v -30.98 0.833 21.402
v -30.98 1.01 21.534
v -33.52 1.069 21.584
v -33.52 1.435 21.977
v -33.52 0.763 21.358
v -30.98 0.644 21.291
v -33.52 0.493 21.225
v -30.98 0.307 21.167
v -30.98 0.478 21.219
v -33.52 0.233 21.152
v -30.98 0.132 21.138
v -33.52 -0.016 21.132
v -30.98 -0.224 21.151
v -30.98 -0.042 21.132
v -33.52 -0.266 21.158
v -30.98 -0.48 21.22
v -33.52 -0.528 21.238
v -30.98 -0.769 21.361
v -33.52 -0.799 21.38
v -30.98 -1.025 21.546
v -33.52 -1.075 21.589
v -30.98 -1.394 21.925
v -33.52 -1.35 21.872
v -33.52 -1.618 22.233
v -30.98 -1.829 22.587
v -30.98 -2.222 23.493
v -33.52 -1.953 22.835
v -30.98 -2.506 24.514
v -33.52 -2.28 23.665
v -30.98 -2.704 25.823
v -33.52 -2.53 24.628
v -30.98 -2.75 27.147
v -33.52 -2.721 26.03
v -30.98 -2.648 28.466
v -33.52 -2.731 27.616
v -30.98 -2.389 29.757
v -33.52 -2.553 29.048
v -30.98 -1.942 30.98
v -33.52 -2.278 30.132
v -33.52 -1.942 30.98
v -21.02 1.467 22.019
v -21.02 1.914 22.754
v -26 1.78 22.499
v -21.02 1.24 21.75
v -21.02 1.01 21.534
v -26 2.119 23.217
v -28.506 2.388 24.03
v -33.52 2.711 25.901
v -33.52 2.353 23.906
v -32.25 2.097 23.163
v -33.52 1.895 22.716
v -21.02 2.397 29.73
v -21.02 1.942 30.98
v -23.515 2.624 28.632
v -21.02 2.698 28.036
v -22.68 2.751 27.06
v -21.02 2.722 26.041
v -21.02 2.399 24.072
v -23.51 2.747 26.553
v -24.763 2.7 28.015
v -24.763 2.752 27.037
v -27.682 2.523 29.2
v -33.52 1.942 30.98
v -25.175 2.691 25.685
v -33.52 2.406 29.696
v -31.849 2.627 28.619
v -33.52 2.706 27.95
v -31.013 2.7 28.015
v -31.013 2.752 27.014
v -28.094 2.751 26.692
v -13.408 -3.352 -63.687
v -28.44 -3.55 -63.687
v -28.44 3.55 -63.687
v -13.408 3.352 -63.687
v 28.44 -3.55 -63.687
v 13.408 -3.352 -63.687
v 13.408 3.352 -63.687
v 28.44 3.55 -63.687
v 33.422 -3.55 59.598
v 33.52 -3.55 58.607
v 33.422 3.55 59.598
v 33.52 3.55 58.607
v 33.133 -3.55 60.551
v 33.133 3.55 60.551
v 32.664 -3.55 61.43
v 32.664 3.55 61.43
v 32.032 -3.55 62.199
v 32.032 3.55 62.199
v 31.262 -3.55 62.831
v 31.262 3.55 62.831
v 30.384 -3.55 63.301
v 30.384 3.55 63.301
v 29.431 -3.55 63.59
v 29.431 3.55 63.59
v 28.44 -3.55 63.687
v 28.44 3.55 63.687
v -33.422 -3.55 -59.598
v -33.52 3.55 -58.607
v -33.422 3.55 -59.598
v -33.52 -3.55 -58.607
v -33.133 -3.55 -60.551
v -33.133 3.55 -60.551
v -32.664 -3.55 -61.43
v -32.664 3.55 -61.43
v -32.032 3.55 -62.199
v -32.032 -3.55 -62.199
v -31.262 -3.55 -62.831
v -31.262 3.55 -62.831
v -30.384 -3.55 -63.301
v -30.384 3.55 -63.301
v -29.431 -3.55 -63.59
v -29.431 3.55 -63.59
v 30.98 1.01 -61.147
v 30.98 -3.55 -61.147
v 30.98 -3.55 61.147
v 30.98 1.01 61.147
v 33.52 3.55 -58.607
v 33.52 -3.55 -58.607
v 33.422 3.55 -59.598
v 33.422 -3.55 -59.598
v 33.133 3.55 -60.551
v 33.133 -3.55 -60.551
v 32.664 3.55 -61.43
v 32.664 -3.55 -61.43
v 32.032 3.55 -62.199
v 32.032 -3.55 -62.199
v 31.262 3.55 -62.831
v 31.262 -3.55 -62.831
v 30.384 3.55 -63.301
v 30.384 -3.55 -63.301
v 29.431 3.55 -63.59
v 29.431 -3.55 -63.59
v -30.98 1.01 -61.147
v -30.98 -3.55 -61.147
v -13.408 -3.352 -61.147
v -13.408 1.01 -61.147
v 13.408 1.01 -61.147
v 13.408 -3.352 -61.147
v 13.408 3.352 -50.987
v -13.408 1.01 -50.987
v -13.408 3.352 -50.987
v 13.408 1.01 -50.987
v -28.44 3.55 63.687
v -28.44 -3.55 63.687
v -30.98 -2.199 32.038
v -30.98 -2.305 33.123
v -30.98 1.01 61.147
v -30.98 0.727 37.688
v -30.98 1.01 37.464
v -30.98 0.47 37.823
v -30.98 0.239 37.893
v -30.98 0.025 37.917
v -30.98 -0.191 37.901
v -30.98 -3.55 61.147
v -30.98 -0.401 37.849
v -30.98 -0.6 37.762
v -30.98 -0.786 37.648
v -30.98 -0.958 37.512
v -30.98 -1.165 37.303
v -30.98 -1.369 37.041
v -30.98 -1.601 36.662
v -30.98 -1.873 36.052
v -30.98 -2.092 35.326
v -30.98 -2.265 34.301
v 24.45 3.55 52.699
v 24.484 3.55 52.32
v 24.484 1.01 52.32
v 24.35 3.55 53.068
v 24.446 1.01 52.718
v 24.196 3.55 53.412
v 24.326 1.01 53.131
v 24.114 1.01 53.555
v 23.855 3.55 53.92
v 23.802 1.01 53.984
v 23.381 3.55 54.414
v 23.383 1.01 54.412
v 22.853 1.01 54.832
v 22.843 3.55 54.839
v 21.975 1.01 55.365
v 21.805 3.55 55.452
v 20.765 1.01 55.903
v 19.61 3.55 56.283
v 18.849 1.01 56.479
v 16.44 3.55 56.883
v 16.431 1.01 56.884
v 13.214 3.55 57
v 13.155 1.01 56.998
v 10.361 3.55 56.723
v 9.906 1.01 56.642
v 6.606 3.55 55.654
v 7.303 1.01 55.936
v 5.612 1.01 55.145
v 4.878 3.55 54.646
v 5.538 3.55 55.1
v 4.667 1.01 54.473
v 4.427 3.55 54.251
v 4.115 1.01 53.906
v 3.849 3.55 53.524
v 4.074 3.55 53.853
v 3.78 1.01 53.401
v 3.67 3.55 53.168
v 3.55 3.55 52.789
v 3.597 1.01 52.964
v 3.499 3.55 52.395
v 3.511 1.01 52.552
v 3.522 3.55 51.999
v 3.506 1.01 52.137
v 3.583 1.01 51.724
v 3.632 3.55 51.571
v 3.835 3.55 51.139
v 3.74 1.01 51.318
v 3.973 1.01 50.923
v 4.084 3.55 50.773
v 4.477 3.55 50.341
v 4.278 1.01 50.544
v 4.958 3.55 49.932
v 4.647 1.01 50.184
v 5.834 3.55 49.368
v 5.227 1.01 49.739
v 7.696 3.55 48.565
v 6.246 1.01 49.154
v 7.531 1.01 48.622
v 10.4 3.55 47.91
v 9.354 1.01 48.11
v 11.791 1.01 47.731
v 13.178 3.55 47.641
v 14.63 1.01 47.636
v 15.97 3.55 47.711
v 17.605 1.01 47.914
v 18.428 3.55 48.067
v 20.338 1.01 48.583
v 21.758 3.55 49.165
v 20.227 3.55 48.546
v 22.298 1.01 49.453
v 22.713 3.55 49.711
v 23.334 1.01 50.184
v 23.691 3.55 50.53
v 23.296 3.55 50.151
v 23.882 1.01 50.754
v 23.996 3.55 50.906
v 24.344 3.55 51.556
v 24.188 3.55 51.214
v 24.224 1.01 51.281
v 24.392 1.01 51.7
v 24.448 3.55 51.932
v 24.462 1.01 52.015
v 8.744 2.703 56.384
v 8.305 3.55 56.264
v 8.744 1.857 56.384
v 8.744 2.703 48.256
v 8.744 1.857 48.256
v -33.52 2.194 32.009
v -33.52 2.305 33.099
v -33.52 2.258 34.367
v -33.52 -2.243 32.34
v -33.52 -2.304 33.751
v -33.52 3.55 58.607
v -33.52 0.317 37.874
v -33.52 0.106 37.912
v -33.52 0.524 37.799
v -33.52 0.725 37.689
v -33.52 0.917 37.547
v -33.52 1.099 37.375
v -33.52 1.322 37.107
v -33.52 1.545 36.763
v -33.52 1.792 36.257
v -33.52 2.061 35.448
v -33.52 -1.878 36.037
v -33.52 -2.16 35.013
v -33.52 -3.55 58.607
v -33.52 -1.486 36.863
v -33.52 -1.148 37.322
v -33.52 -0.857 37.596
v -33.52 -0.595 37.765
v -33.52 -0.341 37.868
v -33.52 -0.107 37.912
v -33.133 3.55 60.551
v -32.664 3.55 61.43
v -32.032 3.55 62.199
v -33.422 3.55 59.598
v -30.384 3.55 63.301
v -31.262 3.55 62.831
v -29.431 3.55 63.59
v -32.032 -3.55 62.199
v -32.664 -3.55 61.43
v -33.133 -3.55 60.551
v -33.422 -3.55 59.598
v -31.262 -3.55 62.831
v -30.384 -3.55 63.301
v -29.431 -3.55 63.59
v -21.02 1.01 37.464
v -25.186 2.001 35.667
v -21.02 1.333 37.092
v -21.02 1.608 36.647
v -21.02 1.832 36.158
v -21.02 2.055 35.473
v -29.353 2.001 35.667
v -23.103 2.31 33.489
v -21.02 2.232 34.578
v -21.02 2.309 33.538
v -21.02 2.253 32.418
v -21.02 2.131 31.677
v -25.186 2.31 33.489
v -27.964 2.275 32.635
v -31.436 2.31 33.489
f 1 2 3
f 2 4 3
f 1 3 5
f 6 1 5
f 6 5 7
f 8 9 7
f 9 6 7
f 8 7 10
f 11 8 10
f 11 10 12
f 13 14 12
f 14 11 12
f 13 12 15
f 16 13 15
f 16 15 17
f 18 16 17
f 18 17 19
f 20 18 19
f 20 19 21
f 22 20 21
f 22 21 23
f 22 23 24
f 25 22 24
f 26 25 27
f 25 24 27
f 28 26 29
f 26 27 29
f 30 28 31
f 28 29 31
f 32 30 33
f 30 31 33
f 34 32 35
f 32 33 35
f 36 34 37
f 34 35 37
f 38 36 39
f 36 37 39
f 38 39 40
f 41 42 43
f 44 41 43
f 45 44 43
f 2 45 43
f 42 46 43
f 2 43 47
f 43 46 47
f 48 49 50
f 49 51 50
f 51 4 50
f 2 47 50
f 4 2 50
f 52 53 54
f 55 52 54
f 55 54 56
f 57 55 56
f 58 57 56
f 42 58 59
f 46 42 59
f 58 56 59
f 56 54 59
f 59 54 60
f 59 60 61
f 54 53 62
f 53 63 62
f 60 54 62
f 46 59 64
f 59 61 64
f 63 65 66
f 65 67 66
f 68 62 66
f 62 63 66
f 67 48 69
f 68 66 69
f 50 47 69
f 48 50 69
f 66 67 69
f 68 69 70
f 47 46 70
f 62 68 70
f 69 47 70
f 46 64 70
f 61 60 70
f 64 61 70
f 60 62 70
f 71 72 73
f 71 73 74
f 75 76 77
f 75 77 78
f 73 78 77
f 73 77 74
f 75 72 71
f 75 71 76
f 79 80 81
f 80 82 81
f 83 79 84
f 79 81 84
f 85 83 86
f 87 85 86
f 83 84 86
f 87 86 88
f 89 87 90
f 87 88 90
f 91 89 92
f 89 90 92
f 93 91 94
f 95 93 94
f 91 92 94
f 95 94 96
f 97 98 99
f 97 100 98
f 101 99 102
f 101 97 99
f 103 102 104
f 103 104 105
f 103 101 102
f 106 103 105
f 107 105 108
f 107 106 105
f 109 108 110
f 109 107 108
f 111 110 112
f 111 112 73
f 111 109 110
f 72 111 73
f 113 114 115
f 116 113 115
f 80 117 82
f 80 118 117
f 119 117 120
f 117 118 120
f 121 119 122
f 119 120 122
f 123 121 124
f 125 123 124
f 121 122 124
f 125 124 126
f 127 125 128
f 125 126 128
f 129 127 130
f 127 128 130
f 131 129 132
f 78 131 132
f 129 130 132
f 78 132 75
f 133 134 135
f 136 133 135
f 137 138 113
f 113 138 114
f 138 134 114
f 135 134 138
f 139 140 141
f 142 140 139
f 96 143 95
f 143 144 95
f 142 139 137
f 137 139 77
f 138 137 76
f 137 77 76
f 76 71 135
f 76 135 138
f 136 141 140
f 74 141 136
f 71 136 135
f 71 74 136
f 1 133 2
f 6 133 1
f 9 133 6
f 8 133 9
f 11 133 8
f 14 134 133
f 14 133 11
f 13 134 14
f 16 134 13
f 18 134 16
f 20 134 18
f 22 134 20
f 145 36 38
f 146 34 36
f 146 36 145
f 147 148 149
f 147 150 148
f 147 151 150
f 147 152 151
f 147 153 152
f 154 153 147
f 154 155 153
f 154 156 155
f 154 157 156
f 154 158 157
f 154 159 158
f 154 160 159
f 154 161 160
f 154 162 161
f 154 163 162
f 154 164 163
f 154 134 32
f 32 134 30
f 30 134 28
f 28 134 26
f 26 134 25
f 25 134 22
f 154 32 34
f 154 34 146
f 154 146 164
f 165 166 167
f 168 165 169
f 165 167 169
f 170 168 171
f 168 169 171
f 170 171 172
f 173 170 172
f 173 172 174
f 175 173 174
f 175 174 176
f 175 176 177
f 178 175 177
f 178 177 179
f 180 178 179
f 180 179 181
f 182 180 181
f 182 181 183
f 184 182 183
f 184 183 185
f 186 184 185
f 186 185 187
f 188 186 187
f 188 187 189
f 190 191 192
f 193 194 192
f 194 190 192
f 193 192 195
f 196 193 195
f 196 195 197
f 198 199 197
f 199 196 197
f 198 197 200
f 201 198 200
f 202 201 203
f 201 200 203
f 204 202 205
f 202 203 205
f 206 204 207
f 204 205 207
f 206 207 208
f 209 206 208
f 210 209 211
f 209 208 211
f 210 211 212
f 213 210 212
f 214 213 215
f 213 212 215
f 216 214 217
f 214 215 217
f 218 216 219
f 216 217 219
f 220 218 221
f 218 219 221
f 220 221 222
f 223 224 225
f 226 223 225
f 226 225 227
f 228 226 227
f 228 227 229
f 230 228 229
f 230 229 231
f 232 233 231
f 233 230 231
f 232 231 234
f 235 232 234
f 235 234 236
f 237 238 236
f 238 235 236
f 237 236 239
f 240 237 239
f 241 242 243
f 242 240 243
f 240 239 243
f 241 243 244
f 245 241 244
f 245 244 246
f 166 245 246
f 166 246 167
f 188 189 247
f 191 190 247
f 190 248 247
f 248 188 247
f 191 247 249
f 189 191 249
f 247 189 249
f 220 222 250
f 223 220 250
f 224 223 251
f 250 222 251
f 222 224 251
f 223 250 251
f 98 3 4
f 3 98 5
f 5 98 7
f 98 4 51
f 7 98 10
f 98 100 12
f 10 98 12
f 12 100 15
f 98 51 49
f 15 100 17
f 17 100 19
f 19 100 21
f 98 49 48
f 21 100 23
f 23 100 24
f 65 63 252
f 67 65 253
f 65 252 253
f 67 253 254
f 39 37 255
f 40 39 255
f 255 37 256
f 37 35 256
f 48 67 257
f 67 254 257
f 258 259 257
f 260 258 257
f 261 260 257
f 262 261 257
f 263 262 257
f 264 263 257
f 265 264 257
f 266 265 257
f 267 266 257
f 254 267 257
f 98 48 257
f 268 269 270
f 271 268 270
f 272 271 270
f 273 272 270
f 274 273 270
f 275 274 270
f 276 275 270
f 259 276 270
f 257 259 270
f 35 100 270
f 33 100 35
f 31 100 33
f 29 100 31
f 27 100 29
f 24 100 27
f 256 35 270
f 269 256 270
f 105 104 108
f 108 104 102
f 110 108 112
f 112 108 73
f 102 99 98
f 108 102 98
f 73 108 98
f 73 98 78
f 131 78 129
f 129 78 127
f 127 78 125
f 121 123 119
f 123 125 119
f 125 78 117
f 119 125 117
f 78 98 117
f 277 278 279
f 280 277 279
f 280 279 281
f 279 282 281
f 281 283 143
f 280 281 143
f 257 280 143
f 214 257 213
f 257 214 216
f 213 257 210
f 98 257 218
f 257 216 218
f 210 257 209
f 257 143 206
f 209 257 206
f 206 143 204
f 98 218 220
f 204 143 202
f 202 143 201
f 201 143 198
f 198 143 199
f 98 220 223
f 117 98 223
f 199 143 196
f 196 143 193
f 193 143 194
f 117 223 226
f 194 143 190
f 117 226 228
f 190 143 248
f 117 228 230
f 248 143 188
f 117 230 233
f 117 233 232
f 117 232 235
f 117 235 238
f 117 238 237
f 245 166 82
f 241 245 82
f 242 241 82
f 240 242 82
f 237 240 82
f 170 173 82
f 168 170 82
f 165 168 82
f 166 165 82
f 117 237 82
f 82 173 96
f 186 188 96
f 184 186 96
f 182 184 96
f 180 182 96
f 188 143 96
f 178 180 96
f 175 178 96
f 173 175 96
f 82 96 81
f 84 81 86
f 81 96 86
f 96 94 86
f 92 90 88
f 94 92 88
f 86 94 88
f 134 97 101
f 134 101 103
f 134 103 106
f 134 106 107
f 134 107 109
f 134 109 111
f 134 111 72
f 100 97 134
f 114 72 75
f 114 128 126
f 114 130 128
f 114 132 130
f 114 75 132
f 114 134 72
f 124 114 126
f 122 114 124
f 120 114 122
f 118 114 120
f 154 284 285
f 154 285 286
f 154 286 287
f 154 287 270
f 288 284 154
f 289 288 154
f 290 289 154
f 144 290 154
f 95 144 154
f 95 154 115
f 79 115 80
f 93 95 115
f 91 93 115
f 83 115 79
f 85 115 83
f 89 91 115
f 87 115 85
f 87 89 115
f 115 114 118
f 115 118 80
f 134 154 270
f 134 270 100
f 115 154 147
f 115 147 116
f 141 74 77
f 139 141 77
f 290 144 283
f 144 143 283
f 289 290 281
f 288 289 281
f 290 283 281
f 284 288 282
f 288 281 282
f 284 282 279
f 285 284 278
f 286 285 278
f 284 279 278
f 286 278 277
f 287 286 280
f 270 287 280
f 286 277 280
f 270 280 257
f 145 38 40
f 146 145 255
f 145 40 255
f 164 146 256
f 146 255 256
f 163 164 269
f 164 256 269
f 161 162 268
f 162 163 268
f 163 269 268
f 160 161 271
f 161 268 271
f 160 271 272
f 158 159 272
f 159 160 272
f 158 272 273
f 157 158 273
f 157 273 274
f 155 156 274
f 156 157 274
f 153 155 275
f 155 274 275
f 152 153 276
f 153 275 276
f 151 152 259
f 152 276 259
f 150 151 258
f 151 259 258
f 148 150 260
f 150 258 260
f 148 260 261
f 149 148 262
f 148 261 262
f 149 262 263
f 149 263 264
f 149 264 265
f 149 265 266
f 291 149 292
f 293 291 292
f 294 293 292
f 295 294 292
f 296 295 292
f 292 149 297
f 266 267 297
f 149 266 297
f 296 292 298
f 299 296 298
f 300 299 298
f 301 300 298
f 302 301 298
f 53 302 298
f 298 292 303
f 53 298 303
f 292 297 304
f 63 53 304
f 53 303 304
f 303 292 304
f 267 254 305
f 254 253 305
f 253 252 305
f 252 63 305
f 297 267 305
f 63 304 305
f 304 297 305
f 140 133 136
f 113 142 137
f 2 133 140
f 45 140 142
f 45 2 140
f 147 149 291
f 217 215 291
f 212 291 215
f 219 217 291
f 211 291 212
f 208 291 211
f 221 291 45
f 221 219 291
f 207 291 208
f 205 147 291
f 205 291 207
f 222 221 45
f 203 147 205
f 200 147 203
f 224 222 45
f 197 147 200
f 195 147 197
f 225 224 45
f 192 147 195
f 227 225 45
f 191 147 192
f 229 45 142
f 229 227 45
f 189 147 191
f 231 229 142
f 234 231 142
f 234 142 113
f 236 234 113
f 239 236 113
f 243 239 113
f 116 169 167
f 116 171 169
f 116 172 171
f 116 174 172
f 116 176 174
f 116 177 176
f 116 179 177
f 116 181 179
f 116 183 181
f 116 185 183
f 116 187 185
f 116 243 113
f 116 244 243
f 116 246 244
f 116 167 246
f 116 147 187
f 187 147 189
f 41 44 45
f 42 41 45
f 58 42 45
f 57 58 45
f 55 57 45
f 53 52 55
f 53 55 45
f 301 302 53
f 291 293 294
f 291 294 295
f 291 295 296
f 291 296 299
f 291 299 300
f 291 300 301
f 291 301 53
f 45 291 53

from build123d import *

# Parameters (mm, degrees)
F0_W      = 67.0393481851
F0_H      = 127.374753356
F1_DEPTH  = 3.55
F2_T      = -2.54
F3_R      = 5.08
F6_DEPTH  = 12.7
F7_W      = 26.815738529
F7_H      = 6.7039346322
F8_DEPTH  = 12.7
F10_DEPTH = 12.5
F12_DEPTH = 12.5


with BuildPart() as f1:
    # F0 (on Front) → F1 (new body, symmetric)
    with BuildSketch(Plane.XZ):
        Rectangle(F0_W, F0_H)
    extrude(amount=F1_DEPTH, both=True)

    # F2
    f2_openings = [f1.faces().sort_by_distance(p)[0] for p in [
        (0, -3.55, 0),
    ]]
    offset(amount=F2_T, openings=f2_openings)

    # F3
    f3_edges = [f1.edges().sort_by_distance(p)[0] for p in [
        (33.519674, 0, -63.687377),
        (-33.519674, 0, -63.687377),
        (-33.519674, 0, 63.687377),
        (33.519674, 0, 63.687377),
    ]]
    fillet(f3_edges, radius=F3_R)

    # F5 (on face) → F6 (cut, symmetric)
    with BuildSketch(Plane.XZ.offset(-1.01)):
        with BuildLine():
            add(Edge.make_bspline(
                [(24.4839340448, 52.3198395967), (24.4839340448, 60.4477757444), (8.7442607619, 56.3838076706), (-6.9954125211, 52.3198395967), (8.7442607619, 48.2558715229), (24.4839340448, 44.1919034491), (24.4839340448, 52.3198395967)],
                knots=[0, 0, 0, 2.0943951024, 2.0943951024, 4.1887902048, 4.1887902048, 6.2831853072, 6.2831853072, 6.2831853072], degree=2, weights=[1, 0.5, 1, 0.5, 1, 0.5, 1]))
        make_face()
    extrude(amount=F6_DEPTH, both=True, mode=Mode.SUBTRACT)

    # F7 (on face) → F8 (cut, symmetric)
    with BuildSketch(Plane(origin=(0, 0, -63.687376678), x_dir=(1, 0, 0), z_dir=(0, 0, -1))):
        Rectangle(F7_W, F7_H)
    extrude(amount=F8_DEPTH, both=True, mode=Mode.SUBTRACT)

    # F9 (on face) → F10 (cut, symmetric)
    with BuildSketch(Plane(origin=(-33.5196740925, 0, 0), x_dir=(0, -1, 0), z_dir=(-1, 0, 0))):
        with BuildLine():
            add(Edge.make_bspline(
                [(0, 28.9168681979), (4.0015380048, 28.9168681979), (2.0007690024, 35.6668681979), (0, 42.4168681979), (-2.0007690024, 35.6668681979), (-4.0015380048, 28.9168681979), (0, 28.9168681979)],
                knots=[0, 0, 0, 2.0943951024, 2.0943951024, 4.1887902048, 4.1887902048, 6.2831853072, 6.2831853072, 6.2831853072], degree=2, weights=[1, 0.5, 1, 0.5, 1, 0.5, 1]))
        make_face()
    extrude(amount=F10_DEPTH, both=True, mode=Mode.SUBTRACT)

    # F11 (on face) → F12 (cut, symmetric)
    with BuildSketch(Plane(origin=(-33.5196740925, 0, 0), x_dir=(0, -1, 0), z_dir=(-1, 0, 0))):
        with BuildLine():
            add(Edge.make_bspline(
                [(0, 28.9168681979), (1.2599189299, 28.9168681979), (1.9422093652, 30.9799598491)],
                knots=[0, 0, 0, 1.0030560238, 1.0030560238, 1.0030560238], degree=2, weights=[1, 0.7605380134, 0.7504441989]))
            add(Edge.make_bspline(
                [(1.9422093652, 30.9799598491), (0, 35.0307743016), (-1.9422093652, 30.9799598491)],
                knots=[2.3582521763, 2.3582521763, 2.3582521763, 3.9249331309, 3.9249331309, 3.9249331309], degree=2, weights=[1, 0.708560287, 1]))
            add(Edge.make_bspline(
                [(-1.9422093652, 30.9799598491), (-1.2599189299, 28.9168681979), (0, 28.9168681979)],
                knots=[5.2801292834, 5.2801292834, 5.2801292834, 6.2831853072, 6.2831853072, 6.2831853072], degree=2, weights=[0.7504441989, 0.7605380134, 1]))
        make_face()
        with BuildLine():
            add(Edge.make_bspline(
                [(-1.9422093652, 30.9799598491), (-6.6641891215, 21.131452173), (0, 21.131452173)],
                knots=[3.9249331309, 3.9249331309, 3.9249331309, 6.2831853072, 6.2831853072, 6.2831853072], degree=2, weights=[1, 0.381732703, 1]))
            add(Edge.make_bspline(
                [(0, 21.131452173), (6.6641891215, 21.131452173), (1.9422093652, 30.9799598491)],
                knots=[0, 0, 0, 2.3582521763, 2.3582521763, 2.3582521763], degree=2, weights=[1, 0.381732703, 1]))
            add(Edge.make_bspline(
                [(0, 28.9168681979), (1.2599189299, 28.9168681979), (1.9422093652, 30.9799598491)],
                knots=[0, 0, 0, 1.0030560238, 1.0030560238, 1.0030560238], degree=2, weights=[1, 0.7605380134, 0.7504441989]))
            add(Edge.make_bspline(
                [(-1.9422093652, 30.9799598491), (-1.2599189299, 28.9168681979), (0, 28.9168681979)],
                knots=[5.2801292834, 5.2801292834, 5.2801292834, 6.2831853072, 6.2831853072, 6.2831853072], degree=2, weights=[0.7504441989, 0.7605380134, 1]))
        make_face()
    extrude(amount=F12_DEPTH, both=True, mode=Mode.SUBTRACT)


solid = f1.part
